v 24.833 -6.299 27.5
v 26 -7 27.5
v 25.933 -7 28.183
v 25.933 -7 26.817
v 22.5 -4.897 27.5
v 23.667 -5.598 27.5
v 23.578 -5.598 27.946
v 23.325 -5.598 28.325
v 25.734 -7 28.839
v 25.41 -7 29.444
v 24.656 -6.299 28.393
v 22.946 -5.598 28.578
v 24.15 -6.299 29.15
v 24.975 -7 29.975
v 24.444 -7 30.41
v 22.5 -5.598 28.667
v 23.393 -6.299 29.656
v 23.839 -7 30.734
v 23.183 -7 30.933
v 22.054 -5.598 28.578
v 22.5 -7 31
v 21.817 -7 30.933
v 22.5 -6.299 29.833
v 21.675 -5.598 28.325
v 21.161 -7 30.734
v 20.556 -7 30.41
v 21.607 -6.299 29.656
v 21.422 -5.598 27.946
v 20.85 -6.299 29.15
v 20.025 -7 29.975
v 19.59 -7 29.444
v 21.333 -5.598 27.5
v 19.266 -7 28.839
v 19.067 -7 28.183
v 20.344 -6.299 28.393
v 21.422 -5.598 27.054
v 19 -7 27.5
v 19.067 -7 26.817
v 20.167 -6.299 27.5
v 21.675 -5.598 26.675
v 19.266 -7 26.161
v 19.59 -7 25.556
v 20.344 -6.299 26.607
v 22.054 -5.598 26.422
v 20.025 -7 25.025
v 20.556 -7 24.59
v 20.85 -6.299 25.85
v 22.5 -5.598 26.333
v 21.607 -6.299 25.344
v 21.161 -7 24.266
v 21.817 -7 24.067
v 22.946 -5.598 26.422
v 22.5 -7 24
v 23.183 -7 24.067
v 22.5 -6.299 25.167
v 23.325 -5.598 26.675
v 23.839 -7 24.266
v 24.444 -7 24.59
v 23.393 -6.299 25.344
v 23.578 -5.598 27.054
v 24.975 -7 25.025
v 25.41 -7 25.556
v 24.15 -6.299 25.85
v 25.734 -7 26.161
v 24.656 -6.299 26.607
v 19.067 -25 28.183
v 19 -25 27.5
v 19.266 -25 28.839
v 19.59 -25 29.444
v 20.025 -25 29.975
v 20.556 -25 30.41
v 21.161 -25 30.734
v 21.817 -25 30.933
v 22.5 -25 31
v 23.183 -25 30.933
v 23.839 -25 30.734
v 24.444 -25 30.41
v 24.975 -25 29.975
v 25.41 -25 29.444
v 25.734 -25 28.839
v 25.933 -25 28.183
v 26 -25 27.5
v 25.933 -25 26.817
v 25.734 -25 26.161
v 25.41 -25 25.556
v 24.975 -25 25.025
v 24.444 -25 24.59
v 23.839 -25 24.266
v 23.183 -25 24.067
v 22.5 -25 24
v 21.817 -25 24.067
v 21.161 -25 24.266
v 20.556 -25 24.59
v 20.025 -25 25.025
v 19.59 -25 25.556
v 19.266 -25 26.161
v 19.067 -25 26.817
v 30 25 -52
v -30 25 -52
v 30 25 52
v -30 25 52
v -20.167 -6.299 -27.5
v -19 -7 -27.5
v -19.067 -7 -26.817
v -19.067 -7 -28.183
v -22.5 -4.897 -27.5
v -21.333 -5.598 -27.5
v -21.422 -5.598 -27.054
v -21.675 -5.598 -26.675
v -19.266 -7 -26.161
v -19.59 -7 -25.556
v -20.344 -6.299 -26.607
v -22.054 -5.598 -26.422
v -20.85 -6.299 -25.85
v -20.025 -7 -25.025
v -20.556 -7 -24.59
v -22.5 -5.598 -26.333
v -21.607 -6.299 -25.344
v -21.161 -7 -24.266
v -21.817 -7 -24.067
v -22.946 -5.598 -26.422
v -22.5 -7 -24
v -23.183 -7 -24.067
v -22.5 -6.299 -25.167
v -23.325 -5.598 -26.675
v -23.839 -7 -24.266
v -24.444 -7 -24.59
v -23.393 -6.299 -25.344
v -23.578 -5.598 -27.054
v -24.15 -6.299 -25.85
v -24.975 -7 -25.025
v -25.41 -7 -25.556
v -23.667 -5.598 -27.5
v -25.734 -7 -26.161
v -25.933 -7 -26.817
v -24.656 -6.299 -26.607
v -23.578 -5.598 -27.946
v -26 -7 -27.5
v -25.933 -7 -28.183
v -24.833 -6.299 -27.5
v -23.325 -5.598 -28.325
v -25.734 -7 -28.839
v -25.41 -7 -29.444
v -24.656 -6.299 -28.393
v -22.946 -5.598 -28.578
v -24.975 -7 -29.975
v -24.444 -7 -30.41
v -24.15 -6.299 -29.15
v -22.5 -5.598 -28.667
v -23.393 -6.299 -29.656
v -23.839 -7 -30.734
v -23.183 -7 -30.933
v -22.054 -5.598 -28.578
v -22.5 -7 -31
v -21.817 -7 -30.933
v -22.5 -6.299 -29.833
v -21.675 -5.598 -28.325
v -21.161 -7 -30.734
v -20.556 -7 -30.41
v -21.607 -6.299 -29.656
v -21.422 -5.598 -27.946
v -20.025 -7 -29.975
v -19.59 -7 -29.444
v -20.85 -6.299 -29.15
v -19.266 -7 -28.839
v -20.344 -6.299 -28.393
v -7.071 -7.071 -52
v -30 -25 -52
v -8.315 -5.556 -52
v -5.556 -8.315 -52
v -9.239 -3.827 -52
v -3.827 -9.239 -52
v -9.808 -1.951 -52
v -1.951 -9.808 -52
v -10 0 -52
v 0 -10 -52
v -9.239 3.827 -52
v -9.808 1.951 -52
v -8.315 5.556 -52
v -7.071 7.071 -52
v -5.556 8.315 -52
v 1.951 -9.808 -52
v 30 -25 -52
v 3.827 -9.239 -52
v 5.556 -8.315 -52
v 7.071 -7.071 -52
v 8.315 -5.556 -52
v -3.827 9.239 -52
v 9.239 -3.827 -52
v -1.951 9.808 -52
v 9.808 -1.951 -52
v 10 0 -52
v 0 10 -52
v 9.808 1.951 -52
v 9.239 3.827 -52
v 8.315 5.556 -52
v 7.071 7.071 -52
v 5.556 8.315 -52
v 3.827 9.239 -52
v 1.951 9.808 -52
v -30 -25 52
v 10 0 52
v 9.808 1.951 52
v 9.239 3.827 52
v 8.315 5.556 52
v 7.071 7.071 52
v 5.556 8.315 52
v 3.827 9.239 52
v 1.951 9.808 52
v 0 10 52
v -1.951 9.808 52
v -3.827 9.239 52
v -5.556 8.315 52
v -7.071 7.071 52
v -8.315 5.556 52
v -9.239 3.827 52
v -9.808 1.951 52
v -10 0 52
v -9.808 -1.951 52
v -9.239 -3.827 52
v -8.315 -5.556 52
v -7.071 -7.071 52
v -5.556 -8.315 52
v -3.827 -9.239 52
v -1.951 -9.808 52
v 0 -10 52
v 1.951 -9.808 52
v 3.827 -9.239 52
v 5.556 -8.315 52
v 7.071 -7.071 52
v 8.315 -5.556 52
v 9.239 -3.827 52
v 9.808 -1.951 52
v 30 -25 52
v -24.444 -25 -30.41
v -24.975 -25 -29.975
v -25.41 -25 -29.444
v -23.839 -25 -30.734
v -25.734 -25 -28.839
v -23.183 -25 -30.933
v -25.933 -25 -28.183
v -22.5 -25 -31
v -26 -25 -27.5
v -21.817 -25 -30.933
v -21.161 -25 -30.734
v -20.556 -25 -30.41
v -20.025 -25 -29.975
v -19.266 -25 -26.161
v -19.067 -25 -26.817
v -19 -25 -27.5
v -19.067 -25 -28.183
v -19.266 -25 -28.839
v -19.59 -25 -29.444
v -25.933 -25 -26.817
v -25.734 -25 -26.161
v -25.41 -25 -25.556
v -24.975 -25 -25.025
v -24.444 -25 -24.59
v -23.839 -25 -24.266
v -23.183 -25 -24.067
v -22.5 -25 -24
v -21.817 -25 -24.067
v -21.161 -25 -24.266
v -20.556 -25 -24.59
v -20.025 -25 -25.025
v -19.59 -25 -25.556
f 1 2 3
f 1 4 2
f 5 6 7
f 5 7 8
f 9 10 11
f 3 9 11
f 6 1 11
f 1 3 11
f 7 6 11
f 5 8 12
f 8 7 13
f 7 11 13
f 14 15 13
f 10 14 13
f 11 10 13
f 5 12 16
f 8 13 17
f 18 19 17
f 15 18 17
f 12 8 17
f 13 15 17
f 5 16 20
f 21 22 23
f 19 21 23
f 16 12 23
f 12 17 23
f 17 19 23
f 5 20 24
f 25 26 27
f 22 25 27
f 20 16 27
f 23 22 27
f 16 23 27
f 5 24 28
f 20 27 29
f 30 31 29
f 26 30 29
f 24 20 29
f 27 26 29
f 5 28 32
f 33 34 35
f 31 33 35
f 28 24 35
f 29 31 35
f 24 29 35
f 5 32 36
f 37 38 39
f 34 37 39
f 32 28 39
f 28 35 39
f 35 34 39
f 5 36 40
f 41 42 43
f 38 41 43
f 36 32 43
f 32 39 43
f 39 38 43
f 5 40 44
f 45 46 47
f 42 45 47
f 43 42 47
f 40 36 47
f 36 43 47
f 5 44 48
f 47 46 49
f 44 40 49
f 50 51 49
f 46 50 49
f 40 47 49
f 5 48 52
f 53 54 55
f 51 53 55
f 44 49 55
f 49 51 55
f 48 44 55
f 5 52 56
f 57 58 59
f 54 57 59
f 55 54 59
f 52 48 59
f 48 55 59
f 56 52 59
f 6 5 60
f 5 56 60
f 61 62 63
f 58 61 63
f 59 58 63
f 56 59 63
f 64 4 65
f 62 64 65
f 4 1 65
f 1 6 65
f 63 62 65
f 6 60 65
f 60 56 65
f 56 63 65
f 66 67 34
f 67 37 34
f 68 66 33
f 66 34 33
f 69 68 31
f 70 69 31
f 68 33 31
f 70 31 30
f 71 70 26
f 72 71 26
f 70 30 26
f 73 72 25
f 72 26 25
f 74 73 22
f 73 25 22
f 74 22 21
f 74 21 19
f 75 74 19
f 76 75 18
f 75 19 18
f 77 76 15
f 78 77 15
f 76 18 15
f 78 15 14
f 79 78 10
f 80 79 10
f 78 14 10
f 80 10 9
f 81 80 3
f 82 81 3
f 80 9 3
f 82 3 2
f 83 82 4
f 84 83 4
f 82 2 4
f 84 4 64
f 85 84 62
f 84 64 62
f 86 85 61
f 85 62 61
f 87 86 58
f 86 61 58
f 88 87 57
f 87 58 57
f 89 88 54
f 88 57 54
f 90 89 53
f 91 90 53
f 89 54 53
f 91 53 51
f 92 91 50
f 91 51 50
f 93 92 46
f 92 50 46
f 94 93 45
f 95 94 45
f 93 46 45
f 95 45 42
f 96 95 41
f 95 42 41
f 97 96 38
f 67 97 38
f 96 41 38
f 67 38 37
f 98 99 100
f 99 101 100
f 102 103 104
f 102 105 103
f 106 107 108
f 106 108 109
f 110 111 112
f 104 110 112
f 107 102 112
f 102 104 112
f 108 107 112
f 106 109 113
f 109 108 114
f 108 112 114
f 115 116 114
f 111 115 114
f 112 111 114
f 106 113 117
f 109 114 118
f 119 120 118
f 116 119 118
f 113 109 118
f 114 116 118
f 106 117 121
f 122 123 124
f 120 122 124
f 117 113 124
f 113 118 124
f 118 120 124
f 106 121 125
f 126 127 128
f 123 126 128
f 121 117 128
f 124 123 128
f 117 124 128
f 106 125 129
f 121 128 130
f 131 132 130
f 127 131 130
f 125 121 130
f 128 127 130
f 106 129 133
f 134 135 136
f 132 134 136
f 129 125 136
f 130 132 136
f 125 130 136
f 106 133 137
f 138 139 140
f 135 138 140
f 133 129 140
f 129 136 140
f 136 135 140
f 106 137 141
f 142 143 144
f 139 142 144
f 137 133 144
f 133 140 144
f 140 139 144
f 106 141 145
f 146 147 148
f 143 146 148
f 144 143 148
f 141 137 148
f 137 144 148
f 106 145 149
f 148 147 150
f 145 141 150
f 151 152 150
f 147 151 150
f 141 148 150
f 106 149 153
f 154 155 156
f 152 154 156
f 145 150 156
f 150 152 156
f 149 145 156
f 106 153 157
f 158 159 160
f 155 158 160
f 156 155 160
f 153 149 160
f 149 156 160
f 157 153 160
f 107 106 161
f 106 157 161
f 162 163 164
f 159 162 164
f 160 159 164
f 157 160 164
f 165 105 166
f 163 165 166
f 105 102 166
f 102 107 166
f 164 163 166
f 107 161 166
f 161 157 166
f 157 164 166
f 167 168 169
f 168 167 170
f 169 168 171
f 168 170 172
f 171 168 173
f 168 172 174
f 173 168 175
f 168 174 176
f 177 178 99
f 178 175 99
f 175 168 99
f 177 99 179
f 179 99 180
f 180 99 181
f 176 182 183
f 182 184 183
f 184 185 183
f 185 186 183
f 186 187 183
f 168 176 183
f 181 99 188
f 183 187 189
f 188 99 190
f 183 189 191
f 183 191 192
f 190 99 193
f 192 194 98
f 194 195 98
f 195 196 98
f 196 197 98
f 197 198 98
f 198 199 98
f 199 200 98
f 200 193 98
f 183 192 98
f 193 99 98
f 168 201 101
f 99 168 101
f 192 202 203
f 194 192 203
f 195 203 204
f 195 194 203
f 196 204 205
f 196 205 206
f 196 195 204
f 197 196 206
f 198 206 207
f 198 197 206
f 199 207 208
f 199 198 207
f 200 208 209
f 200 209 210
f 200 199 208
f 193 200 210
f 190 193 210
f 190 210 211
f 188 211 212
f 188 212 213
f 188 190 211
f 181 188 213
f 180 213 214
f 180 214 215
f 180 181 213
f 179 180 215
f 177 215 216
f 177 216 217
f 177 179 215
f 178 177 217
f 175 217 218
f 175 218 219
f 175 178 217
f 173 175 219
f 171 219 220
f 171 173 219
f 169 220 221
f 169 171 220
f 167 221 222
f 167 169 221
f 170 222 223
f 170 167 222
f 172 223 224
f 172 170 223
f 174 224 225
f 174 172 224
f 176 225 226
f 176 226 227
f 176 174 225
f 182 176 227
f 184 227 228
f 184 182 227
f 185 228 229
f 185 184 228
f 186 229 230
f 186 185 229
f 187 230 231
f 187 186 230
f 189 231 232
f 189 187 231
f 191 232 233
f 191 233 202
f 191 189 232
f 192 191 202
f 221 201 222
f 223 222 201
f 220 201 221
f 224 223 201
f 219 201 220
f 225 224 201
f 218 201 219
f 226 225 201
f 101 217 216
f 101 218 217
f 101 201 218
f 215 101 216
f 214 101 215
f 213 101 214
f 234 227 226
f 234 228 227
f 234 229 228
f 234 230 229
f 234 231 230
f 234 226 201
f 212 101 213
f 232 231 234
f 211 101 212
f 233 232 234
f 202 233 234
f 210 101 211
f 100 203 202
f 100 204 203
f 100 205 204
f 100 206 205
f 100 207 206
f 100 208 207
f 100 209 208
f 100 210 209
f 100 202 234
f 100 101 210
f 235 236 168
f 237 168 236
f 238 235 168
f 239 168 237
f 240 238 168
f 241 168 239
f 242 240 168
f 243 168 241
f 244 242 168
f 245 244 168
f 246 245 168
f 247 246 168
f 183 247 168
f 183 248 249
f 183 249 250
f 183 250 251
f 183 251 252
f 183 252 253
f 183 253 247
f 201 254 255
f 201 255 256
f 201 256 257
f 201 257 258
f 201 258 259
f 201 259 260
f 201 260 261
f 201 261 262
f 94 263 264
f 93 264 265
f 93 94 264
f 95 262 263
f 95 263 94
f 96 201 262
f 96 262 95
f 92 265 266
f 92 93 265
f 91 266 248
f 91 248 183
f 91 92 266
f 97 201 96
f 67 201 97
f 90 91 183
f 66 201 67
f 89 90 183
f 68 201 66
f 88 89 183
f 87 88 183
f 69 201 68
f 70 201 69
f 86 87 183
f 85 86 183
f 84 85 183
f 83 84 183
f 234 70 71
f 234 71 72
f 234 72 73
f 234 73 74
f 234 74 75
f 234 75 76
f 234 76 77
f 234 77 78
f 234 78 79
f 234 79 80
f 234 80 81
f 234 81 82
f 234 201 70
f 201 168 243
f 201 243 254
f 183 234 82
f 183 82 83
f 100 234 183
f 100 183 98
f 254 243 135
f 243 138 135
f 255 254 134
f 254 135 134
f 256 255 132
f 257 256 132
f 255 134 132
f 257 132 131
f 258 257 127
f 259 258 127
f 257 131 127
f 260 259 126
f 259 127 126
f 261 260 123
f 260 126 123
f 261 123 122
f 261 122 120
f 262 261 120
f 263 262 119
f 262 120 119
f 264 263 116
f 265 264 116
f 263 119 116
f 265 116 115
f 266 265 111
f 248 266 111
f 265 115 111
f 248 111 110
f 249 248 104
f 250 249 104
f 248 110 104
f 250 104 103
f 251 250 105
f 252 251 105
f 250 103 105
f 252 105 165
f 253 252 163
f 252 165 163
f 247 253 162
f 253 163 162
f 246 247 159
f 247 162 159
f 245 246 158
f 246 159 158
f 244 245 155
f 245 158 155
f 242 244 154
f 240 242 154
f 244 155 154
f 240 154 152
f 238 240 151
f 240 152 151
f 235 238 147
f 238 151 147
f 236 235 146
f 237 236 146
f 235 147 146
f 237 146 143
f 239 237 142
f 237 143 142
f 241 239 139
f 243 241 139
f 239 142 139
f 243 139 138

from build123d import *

# Parameters (mm, degrees)
F0_W     = 60
F0_H     = 50
F0_R     = 10
F1_DEPTH = 52
F3_D     = 7
F3_DEPTH = 18
F3_TIP   = 2.1030121666


with BuildPart() as f1:
    # F0 (on Top) → F1 (new body, symmetric)
    with BuildSketch(Plane.XY):
        Rectangle(F0_W, F0_H)
        Circle(F0_R, mode=Mode.SUBTRACT)
    extrude(amount=F1_DEPTH, both=True)

    # F3
    with Locations(Plane.XZ.offset(25)):
        with Locations((22.5, 27.5), (-22.5, -27.5)):
            Hole(F3_D / 2, depth=F3_DEPTH)
            with Locations((0, 0, -(F3_DEPTH + F3_TIP / 2))):  # 118° drill point
                Cone(0, F3_D / 2, F3_TIP, mode=Mode.SUBTRACT)


solid = f1.part
